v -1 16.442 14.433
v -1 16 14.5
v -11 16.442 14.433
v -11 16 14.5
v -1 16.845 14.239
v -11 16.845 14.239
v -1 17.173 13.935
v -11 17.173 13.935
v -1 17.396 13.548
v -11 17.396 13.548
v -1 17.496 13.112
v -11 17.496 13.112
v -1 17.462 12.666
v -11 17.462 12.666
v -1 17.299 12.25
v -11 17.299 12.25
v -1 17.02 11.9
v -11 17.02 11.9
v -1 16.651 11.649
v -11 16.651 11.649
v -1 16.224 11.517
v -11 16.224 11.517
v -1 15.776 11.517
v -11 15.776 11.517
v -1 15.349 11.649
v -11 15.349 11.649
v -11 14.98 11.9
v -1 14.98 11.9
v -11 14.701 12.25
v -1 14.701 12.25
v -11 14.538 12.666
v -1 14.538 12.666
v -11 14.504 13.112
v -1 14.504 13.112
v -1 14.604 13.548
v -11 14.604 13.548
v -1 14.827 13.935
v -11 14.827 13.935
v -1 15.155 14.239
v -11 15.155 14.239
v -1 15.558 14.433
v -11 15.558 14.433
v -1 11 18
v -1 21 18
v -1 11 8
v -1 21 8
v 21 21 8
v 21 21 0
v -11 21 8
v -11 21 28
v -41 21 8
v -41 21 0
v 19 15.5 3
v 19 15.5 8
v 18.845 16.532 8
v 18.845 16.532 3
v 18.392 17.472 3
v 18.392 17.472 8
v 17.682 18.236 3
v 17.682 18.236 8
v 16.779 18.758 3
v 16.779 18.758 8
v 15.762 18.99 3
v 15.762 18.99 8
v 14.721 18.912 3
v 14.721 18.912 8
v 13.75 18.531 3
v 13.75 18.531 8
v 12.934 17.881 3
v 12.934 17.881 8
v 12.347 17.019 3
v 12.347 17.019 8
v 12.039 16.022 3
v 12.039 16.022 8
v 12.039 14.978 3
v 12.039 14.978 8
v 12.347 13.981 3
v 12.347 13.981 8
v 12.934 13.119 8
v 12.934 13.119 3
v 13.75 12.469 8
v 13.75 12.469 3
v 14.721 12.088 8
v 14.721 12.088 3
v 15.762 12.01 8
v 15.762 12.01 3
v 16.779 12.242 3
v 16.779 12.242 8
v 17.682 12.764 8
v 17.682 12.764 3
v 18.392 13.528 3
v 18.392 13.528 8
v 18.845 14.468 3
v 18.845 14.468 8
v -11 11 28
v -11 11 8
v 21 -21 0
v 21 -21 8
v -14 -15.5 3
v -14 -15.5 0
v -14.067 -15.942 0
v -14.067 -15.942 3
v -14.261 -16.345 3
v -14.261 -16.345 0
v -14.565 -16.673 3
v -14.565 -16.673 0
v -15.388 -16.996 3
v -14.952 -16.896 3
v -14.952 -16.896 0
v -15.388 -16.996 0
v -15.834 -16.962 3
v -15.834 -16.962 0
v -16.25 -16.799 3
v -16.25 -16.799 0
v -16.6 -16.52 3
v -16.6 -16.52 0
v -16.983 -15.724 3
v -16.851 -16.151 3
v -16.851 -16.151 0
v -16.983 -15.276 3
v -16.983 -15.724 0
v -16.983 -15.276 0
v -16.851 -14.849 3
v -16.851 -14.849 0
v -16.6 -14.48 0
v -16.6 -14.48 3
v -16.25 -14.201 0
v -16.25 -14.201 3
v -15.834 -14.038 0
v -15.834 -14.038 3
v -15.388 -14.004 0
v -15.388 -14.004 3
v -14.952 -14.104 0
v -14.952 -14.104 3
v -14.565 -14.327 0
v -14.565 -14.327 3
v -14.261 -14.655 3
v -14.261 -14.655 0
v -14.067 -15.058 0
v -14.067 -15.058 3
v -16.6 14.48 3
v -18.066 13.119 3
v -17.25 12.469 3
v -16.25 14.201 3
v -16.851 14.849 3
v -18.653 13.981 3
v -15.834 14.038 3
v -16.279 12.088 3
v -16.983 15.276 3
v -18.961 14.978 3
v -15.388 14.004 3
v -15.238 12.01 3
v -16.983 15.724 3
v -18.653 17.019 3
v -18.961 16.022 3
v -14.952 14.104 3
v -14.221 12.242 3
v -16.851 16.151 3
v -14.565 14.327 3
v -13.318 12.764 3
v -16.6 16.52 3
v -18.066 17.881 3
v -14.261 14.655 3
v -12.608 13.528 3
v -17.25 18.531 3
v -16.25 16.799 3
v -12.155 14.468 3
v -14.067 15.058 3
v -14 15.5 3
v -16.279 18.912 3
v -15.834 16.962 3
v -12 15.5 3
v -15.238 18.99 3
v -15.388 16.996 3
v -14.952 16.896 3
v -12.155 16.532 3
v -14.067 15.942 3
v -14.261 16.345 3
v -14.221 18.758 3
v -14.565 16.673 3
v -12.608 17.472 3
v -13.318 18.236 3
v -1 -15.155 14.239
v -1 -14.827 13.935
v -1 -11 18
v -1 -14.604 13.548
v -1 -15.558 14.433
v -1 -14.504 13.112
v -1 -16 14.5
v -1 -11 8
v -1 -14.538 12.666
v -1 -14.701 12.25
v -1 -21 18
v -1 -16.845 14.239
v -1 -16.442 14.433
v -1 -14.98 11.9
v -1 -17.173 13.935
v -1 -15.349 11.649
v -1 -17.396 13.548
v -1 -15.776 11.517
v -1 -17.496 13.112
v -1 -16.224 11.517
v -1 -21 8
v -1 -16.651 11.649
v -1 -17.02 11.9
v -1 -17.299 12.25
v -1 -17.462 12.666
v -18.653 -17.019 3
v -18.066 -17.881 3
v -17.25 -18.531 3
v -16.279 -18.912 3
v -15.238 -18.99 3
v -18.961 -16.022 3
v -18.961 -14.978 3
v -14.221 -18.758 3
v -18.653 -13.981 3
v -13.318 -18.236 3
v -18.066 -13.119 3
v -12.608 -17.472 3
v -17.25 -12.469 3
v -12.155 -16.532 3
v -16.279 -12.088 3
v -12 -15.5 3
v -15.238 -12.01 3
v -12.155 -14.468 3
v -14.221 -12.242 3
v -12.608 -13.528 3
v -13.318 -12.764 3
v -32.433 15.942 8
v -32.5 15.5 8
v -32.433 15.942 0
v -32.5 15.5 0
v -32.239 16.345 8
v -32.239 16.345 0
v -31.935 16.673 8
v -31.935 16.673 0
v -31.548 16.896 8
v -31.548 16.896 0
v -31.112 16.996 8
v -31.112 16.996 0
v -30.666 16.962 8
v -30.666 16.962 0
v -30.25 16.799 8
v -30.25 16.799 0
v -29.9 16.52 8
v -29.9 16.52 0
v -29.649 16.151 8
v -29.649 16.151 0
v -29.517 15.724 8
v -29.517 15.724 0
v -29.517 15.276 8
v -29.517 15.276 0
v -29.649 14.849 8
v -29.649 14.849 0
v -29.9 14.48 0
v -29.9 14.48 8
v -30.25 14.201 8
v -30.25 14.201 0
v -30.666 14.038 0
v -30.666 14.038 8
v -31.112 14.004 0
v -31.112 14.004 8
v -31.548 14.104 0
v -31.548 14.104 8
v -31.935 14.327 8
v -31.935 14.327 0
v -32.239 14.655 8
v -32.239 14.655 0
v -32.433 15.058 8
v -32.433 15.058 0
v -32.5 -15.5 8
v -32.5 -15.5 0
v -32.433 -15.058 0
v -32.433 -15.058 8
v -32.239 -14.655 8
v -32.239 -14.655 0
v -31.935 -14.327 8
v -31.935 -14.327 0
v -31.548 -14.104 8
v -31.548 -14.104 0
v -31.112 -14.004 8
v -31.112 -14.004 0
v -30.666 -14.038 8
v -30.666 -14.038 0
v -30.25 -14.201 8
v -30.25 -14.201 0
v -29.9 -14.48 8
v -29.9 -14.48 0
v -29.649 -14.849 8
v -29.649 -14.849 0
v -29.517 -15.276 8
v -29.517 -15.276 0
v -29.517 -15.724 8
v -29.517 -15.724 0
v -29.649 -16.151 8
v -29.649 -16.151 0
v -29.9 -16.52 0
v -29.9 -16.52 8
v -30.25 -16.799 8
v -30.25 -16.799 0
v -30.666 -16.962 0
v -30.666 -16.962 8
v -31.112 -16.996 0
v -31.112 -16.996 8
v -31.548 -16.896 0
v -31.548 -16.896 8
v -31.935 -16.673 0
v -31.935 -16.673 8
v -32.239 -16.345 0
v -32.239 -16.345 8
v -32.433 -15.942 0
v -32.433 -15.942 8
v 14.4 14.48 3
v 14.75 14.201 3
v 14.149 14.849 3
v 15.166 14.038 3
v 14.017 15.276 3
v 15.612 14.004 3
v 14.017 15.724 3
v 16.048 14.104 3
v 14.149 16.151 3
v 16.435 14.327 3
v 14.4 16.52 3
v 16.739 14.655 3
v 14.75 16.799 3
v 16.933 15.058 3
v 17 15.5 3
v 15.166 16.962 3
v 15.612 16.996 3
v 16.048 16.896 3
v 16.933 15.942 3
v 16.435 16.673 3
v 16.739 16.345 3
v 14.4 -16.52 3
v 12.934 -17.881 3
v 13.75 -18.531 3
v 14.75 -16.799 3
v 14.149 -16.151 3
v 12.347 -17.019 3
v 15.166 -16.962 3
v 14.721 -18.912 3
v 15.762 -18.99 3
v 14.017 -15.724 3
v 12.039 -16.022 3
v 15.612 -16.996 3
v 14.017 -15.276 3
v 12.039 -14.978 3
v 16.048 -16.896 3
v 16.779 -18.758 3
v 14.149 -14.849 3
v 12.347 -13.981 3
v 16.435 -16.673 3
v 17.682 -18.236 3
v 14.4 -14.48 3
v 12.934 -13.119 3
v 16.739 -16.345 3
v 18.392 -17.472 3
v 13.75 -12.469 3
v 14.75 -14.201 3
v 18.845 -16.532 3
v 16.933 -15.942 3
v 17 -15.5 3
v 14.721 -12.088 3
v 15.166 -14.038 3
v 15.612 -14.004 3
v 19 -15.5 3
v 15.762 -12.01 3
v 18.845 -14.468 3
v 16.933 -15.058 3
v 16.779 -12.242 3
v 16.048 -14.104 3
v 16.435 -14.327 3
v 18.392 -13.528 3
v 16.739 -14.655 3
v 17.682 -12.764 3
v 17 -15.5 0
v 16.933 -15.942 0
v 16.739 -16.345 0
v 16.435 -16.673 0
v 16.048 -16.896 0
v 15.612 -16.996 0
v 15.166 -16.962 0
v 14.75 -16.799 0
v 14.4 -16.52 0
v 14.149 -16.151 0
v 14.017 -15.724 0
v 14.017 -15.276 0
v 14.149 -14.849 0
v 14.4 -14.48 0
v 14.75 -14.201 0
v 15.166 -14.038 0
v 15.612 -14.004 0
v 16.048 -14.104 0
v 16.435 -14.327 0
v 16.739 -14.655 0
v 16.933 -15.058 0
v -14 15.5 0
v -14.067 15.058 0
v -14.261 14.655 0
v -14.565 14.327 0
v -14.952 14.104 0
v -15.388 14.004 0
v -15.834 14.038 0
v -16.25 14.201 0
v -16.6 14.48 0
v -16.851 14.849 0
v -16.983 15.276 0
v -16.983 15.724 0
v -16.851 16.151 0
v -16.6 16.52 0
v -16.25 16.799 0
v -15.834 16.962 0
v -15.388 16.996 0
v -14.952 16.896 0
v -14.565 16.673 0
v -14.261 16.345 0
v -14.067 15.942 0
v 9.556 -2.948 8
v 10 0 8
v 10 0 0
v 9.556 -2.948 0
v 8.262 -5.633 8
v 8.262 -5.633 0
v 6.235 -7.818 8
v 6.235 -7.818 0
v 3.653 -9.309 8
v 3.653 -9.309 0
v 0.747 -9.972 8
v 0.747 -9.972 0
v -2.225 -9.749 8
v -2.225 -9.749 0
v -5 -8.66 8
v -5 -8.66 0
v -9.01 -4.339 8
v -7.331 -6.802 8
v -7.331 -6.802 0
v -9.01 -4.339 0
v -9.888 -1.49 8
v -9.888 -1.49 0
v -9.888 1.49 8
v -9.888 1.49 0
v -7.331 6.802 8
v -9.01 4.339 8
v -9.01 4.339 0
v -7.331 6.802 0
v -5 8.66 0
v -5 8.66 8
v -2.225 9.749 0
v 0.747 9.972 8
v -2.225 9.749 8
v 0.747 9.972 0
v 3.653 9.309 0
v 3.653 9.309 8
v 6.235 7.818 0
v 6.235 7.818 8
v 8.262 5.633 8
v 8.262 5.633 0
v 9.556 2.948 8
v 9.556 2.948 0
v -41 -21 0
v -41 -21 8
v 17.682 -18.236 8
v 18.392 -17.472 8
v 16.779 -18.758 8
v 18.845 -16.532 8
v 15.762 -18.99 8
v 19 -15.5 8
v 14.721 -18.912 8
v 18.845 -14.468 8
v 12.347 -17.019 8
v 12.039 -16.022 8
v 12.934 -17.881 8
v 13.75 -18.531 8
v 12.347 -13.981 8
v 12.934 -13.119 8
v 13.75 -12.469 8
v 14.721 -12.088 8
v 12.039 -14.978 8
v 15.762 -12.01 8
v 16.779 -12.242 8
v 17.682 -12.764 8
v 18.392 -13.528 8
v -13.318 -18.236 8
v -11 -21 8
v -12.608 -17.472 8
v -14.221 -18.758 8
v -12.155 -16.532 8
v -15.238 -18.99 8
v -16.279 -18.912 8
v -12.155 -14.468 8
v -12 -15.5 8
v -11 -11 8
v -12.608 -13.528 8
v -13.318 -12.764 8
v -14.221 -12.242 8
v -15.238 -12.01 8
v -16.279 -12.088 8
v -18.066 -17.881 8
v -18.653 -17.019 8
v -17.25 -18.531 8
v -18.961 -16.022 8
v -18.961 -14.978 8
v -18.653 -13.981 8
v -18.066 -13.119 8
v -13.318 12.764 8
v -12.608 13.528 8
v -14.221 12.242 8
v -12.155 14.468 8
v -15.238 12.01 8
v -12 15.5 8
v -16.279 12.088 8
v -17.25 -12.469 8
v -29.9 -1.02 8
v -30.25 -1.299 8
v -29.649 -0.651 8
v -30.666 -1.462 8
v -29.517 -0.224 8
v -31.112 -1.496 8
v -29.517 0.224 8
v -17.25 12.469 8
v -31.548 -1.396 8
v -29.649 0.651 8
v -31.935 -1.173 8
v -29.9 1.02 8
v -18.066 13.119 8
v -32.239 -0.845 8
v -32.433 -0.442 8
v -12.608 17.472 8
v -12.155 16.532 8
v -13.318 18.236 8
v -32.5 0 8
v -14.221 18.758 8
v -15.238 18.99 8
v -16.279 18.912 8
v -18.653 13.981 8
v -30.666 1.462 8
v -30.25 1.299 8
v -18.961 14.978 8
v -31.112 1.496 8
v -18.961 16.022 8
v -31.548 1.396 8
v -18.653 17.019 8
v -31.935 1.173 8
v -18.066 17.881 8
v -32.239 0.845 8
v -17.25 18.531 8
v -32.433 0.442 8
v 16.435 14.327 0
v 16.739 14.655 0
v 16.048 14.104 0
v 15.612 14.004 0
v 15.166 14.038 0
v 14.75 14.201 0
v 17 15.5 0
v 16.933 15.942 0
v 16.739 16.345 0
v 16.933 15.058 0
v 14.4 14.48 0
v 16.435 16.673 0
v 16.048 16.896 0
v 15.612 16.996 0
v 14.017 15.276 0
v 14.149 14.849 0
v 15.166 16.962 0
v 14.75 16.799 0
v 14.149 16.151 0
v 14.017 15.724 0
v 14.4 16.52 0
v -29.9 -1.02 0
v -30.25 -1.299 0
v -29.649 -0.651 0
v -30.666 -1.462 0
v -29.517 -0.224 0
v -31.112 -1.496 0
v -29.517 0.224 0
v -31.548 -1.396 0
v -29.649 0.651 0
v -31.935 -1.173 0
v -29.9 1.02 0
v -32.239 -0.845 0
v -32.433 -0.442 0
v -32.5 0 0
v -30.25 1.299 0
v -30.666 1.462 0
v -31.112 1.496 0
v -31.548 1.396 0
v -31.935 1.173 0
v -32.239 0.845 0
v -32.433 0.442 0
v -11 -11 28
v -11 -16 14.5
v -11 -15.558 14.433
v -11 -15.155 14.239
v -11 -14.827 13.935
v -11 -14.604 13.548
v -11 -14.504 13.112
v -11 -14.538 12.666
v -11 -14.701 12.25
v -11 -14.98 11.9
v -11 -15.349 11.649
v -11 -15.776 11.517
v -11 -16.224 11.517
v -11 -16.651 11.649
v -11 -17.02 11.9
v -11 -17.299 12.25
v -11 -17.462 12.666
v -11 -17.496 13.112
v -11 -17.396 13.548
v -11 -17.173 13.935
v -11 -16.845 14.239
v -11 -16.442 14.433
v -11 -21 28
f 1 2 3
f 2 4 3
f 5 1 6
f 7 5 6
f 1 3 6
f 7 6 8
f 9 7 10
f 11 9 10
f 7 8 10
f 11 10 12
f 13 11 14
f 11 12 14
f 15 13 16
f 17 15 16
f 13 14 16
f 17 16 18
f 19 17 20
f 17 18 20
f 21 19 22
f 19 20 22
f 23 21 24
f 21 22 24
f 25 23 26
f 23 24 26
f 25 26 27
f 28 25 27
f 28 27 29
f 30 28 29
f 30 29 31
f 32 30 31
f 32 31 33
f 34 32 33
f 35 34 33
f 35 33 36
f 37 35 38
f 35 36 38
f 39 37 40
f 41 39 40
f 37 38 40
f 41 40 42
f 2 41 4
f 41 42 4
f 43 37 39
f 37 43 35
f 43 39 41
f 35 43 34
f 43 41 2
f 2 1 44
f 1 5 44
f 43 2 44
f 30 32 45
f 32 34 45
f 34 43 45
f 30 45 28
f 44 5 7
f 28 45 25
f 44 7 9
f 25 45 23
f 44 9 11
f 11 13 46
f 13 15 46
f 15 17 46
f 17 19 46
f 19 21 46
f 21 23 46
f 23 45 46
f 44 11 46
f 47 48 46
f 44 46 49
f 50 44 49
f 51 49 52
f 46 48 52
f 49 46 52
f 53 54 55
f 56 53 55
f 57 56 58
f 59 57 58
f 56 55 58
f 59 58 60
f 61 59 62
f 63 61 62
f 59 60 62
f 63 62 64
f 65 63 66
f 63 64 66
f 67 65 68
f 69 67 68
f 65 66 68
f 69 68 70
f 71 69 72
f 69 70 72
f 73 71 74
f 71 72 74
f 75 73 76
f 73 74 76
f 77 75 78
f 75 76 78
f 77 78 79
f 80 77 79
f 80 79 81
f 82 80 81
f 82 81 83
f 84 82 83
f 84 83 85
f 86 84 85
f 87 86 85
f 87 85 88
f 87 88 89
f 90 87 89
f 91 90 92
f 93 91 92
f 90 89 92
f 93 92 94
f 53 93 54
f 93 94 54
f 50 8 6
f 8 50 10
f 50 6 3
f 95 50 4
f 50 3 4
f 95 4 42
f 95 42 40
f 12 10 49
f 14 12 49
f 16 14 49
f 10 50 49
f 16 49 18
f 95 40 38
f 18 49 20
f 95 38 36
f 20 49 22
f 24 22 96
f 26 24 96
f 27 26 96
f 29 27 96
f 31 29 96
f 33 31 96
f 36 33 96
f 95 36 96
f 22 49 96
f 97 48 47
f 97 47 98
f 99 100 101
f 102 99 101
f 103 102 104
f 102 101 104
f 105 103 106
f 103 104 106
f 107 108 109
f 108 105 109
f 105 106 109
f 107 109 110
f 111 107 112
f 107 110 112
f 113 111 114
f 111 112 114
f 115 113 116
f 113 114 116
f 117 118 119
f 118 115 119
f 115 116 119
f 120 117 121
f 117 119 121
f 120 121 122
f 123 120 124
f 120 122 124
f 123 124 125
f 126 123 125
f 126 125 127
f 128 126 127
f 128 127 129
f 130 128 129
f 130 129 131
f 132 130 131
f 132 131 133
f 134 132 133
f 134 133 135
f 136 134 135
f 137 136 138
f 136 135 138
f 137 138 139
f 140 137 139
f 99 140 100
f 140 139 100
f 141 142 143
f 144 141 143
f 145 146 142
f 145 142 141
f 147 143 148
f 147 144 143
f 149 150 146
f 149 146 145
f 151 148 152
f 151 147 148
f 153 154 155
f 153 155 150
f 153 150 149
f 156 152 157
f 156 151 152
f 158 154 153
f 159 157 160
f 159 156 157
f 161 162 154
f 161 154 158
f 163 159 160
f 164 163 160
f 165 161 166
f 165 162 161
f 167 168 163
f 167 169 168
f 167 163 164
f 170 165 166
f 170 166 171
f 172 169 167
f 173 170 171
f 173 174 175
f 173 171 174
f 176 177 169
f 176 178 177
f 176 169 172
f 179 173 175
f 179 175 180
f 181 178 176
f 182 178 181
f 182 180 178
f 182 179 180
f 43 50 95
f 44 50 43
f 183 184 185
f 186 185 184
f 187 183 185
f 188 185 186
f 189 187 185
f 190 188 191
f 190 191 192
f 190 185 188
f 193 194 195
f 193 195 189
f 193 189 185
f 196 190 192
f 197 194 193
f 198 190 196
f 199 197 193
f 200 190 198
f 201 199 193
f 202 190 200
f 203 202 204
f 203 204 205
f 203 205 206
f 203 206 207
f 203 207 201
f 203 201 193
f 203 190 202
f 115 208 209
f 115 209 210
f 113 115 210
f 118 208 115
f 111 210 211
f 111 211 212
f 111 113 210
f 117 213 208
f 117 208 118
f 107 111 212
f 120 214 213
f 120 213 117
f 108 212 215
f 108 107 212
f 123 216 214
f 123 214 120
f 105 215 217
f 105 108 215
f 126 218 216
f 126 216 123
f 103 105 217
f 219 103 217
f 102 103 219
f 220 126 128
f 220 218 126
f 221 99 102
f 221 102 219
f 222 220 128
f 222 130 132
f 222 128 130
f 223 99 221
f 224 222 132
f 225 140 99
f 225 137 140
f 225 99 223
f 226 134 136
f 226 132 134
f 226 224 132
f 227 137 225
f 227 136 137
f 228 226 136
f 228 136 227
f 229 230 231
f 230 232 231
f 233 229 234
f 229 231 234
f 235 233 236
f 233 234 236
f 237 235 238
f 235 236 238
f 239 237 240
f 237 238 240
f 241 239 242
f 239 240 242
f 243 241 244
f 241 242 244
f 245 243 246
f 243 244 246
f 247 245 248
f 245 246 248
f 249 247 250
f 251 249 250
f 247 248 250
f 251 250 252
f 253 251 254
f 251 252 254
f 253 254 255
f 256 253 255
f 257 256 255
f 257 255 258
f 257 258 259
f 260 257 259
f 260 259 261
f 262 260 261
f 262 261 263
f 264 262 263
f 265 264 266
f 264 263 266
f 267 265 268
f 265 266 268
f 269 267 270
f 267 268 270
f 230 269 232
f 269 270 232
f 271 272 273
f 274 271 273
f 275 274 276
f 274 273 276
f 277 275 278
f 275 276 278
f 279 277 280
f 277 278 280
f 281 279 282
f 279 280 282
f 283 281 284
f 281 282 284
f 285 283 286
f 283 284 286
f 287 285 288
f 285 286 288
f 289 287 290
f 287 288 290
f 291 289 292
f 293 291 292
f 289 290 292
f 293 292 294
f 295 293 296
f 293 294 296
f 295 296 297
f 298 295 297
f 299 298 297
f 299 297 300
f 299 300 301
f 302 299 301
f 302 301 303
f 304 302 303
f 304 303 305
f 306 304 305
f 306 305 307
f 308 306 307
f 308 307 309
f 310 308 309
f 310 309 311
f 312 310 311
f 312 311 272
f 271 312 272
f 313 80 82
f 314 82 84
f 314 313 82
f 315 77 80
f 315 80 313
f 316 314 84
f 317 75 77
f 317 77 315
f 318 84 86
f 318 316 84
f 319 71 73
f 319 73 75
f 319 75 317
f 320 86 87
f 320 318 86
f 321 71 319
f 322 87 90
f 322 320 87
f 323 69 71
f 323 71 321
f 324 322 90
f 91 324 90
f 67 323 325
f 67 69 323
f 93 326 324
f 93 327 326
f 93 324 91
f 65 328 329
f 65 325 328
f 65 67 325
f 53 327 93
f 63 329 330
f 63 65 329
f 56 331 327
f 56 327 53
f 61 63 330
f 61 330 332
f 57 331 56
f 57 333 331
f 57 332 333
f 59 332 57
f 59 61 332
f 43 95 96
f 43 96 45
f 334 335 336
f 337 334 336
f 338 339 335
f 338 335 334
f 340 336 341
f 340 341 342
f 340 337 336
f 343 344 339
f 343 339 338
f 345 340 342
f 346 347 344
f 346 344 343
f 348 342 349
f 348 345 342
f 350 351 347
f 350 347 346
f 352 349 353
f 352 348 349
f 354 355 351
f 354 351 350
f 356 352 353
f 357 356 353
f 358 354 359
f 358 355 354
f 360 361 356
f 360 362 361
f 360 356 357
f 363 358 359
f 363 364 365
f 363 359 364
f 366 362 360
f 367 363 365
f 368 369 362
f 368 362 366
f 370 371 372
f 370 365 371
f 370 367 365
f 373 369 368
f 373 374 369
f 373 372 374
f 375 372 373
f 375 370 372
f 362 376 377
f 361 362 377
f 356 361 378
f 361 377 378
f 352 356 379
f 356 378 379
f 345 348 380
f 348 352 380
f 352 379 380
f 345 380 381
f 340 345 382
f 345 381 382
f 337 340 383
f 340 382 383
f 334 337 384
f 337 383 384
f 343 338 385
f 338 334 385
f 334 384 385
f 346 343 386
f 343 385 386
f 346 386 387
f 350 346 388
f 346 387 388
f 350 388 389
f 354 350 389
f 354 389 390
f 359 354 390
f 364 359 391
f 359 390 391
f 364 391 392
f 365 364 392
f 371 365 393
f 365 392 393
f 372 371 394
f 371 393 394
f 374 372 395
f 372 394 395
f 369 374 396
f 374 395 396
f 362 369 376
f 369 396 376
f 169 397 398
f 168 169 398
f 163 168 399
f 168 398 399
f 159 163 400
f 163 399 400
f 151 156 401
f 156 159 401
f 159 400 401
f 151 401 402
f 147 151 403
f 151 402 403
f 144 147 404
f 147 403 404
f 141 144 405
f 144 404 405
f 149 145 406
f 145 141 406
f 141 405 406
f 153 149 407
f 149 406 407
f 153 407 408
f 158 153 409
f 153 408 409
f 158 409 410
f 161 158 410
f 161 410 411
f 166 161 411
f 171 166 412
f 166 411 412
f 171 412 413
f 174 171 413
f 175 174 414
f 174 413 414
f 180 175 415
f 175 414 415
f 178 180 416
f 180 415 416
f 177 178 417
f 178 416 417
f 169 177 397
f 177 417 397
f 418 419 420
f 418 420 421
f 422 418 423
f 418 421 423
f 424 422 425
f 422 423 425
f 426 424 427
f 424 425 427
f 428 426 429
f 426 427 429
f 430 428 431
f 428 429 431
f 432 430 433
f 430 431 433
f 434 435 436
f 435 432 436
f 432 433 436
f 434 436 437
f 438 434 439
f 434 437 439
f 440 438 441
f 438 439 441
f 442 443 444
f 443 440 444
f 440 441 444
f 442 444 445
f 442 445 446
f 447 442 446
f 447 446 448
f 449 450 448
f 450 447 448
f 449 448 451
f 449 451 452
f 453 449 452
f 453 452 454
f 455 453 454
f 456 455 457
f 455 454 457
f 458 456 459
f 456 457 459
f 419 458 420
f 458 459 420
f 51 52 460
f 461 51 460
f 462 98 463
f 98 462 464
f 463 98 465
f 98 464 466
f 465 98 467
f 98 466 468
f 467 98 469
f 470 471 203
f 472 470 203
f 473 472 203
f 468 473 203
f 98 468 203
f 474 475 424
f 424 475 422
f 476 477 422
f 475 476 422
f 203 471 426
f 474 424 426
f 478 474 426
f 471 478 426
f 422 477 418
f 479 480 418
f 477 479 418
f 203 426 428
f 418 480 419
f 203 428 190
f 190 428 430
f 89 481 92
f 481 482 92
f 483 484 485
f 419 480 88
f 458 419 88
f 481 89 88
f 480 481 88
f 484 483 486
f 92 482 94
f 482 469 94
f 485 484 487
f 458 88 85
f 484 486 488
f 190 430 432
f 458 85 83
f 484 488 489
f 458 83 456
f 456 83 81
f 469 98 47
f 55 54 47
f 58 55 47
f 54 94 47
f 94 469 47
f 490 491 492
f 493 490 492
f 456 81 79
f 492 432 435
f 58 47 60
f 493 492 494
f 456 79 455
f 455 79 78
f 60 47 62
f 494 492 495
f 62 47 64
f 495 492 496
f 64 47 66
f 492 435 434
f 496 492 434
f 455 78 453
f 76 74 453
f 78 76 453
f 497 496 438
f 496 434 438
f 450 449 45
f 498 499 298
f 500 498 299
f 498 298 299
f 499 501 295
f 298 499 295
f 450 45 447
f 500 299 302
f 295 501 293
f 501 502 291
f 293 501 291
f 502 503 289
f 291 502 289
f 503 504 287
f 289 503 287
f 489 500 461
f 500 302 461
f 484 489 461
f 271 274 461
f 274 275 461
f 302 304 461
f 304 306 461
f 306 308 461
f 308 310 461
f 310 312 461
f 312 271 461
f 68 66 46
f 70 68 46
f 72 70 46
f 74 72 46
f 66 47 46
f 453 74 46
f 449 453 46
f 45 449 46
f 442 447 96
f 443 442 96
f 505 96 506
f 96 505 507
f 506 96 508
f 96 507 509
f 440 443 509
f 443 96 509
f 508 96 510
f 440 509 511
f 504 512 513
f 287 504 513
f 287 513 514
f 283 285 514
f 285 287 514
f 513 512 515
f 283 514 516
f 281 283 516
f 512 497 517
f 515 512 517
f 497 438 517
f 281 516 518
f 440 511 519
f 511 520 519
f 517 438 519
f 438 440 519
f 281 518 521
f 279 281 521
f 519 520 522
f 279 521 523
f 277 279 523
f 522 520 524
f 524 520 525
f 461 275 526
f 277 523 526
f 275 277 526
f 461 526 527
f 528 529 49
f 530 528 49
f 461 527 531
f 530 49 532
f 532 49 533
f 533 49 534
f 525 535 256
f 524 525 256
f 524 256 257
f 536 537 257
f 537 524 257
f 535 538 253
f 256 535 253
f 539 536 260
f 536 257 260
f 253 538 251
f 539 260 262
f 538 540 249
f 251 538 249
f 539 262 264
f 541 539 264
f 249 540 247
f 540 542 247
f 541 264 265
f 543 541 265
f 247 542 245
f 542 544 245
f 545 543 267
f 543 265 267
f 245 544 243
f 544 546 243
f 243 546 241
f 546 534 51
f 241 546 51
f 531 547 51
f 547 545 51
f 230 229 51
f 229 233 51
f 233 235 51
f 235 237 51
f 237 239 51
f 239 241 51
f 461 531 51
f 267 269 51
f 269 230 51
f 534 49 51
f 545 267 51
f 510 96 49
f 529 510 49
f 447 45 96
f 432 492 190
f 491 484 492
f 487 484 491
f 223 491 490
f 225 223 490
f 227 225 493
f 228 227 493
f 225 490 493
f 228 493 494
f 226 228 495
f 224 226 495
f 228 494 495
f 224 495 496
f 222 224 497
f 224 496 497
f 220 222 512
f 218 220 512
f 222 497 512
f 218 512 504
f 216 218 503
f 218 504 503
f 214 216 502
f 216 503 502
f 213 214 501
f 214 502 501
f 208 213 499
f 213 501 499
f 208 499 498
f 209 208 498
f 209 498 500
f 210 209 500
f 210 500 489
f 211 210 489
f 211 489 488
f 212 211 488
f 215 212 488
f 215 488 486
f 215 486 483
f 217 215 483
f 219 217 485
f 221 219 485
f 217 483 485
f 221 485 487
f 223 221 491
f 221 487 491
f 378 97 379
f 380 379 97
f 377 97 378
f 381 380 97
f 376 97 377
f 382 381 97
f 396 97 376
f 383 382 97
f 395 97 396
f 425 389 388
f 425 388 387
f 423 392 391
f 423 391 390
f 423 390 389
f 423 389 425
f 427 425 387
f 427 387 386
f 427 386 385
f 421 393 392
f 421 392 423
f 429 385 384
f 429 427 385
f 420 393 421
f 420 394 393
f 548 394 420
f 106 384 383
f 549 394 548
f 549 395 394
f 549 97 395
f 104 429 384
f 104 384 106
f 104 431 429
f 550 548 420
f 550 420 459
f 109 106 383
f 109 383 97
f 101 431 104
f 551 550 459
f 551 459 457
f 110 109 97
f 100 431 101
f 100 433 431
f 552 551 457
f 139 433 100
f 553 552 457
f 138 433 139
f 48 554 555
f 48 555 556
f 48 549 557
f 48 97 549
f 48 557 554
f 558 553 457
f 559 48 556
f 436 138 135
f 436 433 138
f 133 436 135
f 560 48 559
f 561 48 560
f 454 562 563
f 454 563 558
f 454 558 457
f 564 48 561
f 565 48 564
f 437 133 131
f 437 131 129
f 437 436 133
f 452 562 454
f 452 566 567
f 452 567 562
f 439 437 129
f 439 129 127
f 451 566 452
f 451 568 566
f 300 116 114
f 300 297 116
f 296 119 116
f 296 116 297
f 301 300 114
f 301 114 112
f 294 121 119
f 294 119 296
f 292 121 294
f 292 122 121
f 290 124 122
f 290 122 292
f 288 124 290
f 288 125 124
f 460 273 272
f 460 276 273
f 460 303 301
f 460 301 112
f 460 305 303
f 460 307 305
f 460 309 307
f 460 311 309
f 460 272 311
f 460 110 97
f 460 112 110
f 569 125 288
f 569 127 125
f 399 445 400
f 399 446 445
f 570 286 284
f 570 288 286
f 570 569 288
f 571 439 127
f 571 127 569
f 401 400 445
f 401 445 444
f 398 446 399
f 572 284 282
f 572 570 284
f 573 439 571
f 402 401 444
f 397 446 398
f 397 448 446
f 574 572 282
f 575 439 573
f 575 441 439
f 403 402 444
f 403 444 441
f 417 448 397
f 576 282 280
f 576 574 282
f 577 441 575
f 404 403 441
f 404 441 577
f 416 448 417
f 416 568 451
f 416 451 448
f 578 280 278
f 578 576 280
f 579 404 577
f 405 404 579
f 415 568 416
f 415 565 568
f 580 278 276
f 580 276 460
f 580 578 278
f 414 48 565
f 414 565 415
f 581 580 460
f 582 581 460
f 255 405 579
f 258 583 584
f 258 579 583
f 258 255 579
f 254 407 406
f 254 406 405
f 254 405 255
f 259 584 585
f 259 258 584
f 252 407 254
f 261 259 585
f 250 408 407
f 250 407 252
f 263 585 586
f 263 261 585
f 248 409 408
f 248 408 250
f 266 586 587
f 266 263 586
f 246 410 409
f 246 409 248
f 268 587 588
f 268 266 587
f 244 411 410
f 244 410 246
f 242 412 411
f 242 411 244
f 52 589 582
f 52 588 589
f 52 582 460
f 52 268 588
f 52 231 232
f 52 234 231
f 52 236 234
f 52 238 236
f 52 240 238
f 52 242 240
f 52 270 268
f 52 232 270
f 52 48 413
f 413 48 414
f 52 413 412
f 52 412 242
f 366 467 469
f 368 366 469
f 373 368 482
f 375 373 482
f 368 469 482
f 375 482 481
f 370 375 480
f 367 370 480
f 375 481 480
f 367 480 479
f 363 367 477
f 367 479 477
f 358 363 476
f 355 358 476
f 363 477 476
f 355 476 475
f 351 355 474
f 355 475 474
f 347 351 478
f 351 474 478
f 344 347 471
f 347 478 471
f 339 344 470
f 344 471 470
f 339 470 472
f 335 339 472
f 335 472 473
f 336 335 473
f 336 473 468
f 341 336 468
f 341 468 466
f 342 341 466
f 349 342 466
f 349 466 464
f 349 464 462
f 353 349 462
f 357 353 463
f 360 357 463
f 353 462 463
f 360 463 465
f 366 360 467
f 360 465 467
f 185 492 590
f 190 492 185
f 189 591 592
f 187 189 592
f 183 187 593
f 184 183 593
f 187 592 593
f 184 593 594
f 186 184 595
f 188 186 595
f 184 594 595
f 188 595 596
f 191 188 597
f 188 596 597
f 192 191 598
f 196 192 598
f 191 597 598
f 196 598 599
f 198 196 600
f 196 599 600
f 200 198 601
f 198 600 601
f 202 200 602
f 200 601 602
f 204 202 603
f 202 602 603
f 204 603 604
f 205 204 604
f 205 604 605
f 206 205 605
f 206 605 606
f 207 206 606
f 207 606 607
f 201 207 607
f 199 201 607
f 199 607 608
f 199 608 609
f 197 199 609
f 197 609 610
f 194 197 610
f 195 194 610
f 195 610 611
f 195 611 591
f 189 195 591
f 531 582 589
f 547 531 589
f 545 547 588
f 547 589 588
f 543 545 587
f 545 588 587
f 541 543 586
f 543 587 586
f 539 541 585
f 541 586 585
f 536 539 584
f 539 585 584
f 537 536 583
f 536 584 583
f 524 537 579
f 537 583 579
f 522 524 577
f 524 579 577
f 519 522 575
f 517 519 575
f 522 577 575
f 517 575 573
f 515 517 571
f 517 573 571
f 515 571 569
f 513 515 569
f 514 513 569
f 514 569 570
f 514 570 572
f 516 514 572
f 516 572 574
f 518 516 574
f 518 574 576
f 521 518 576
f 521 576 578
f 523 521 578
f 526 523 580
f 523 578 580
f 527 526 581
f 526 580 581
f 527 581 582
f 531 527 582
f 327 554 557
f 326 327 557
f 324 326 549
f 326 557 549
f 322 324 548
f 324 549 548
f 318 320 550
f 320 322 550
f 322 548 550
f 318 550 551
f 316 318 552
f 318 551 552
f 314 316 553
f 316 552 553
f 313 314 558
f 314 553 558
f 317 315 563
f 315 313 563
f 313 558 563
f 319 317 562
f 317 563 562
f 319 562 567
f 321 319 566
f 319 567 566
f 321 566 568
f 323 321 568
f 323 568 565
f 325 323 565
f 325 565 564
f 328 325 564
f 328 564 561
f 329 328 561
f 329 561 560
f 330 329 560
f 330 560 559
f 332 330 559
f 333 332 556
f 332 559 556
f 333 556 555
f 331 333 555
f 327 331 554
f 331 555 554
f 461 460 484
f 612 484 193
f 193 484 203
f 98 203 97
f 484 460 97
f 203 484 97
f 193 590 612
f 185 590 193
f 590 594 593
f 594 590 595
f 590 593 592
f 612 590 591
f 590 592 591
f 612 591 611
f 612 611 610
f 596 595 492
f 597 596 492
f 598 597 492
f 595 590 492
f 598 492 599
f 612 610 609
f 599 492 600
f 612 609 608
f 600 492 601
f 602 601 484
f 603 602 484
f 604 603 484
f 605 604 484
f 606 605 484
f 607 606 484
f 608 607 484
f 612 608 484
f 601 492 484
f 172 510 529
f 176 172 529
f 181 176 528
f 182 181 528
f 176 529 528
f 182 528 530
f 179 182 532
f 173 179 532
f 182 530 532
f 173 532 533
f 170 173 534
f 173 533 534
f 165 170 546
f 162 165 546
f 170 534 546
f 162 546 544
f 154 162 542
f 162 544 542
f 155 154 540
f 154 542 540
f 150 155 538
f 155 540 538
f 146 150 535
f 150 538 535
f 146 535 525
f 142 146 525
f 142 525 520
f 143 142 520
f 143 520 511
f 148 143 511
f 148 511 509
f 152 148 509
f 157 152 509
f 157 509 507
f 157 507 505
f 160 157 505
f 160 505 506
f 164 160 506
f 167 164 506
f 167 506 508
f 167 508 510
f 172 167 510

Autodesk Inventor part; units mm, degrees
ref_plane "YZ Plane" through (0, 0, 0) normal (1, 0, 0) x (0, 1, 0)
ref_plane "XZ Plane" through (0, 0, 0) normal (0, 1, 0) x (-1, 0, 0)
ref_plane "XY Plane" through (0, 0, 0) normal (0, 0, 1) x (1, 0, 0)
sketch "Sketch1" plane through (0, 0, 0) normal (0, 0, 1) x (1, 0, 0)
  line L0 (21, -21) -> (-21, -21)
  line L1 (-21, -21) -> (-21, 21)
  line L2 (-21, 21) -> (21, 21)
  line L3 (21, 21) -> (21, -21)
  line L4 (21, -21) -> (-21, 21) construction
  line L5 (-21, -21) -> (21, 21) construction
  circle A0 centre (-15.5, 15.5) radius 1.5
  circle A1 centre (15.5, 15.5) radius 1.5
  circle A2 centre (15.5, -15.5) radius 1.5
  circle A3 centre (-15.5, -15.5) radius 1.5
  line L6 (-15.5, 15.5) -> (-15.5, -15.5) construction
  line L7 (-15.5, 15.5) -> (15.5, 15.5) construction
  line L8 (15.5, 15.5) -> (15.5, -15.5) construction
  circle A4 centre (-15.5, 15.5) radius 4.5
  circle A5 centre (15.5, 15.5) radius 4.5
  circle A6 centre (15.5, -15.5) radius 4.5
  circle A7 centre (-15.5, -15.5) radius 4.5
  circle A8 centre (0, 0) radius 10
  dimension "d0" = 42
  dimension "d1" = 42
  dimension "d2" = 31
  dimension "d3" = 3
  dimension "d4" = 3
  dimension "d7" = 20
extrude "Extrusion1" add sketch "Sketch1" along normal blind 8 contours L0 L1 L2 L3 | A4 | A5 | A6 | A7
sketch "Sketch2" plane through (0, 0, 8) normal (0, 0, 1) x (1, 0, 0)
  line L0 (21, 21) -> (-21, 21) projected
  line L1 (-21, 21) -> (-21, -21) projected
  line L2 (-21, -21) -> (21, -21) projected
  line L3 (21, -21) -> (21, 21) projected
  circle A0 centre (-15.5, 15.5) radius 1.5 projected
  circle A1 centre (15.5, 15.5) radius 1.5 projected
  circle A2 centre (15.5, -15.5) radius 1.5 projected
  circle A3 centre (0, 0) radius 10 projected
  circle A4 centre (-15.5, -15.5) radius 1.5 projected
  circle A5 centre (-15.5, 15.5) radius 3.5
  circle A6 centre (15.5, 15.5) radius 3.5
  circle A7 centre (15.5, -15.5) radius 3.5
  circle A8 centre (-15.5, -15.5) radius 3.5
  dimension "d10" = 7
extrude "Extrusion3" cut sketch "Sketch2" against normal blind 5 contours A5 | A6 | A7 | A8
sketch "Sketch3" plane through (0, 0, 8) normal (0, 0, 1) x (1, 0, 0)
  circle A0 centre (15.5, -15.5) radius 3.5 projected
  circle A1 centre (15.5, 15.5) radius 3.5 projected
  circle A2 centre (-15.5, -15.5) radius 3.5 projected
  circle A3 centre (-15.5, 15.5) radius 3.5 projected
  line L0 (21, 21) -> (-21, 21) projected
  line L1 (-21, 21) -> (-21, -21) projected
  line L2 (-21, -21) -> (21, -21) projected
  line L3 (21, -21) -> (21, 21) projected
  circle A4 centre (0, 0) radius 10 projected
  line L4 (-11, 21) -> (-11, -21)
  line L5 (-11, 11) -> (-1, 11)
  line L6 (-1, 11) -> (-1, 21)
  line L7 (-11, -11) -> (-1, -11)
  line L8 (-1, -11) -> (-1, -21)
  dimension "d13" = 10
  dimension "d14" = 10
  dimension "d15" = 10
extrude "Extrusion4" add sketch "Sketch3" along normal blind 10 contours L6 L5 L4 L0 | L2 L4 L7 L8
sketch "Sketch4" plane through (0, 0, 0) normal (0, 0, -1) x (-1, 0, 0)
  line L0 (21, 21) -> (21, -21) projected
  line L1 (21, 21) -> (41, 21)
  line L2 (41, 21) -> (41, -21)
  line L3 (41, -21) -> (21, -21)
  circle A0 centre (31, 15.5) radius 1.5
  circle A1 centre (31, -15.5) radius 1.5
  line L4 (31, 15.5) -> (31, -15.5) construction
  line L5 (31, 0) -> (21, 0) construction
  circle A2 centre (31, 0) radius 1.5
  point P0 (0, 0)
  dimension "d18" = 31
  dimension "d19" = 10
  dimension "d20" = 10
  dimension "d21" = 3
extrude "Extrusion5" add sketch "Sketch4" against normal up to surface (8 mm away)
sketch "Sketch5" plane through (-11, 11, 8) normal (-1, 0, 0) x (0, 0, 1)
  line L0 (0, 0) -> (0, 10) projected
  line L1 (0, 0) -> (10, 0) projected
  line L2 (10, 10) -> (10, 0) projected
  line L3 (0, 10) -> (10, 10) projected
  line L4 (0, -32) -> (0, -22) projected
  line L5 (0, -32) -> (10, -32) projected
  line L6 (10, -22) -> (10, -32) projected
  line L7 (0, -22) -> (10, -22) projected
  line L8 (10, 10) -> (0, 0) construction
  line L9 (10, 0) -> (0, 10) construction
  line L10 (10, -32) -> (0, -22) construction
  line L11 (10, -22) -> (0, -32) construction
  circle A0 centre (5, 5) radius 1.5
  circle A1 centre (5, -27) radius 1.5
  point P0 (-8, -11)
  dimension "d24" = 3
  dimension "d25" = 3
extrude "Extrusion6" cut sketch "Sketch5" against normal through all contours A0 | A1
draft "FaceDraft1" angle 45 pull direction (1, 0, 0) faces at (-7.6667, -14.3333, 18) (-7.6667, 17.6667, 18) fixed edges at (-1, -16, 18) (-1, 16, 18)
properties part number "end motor holder"
